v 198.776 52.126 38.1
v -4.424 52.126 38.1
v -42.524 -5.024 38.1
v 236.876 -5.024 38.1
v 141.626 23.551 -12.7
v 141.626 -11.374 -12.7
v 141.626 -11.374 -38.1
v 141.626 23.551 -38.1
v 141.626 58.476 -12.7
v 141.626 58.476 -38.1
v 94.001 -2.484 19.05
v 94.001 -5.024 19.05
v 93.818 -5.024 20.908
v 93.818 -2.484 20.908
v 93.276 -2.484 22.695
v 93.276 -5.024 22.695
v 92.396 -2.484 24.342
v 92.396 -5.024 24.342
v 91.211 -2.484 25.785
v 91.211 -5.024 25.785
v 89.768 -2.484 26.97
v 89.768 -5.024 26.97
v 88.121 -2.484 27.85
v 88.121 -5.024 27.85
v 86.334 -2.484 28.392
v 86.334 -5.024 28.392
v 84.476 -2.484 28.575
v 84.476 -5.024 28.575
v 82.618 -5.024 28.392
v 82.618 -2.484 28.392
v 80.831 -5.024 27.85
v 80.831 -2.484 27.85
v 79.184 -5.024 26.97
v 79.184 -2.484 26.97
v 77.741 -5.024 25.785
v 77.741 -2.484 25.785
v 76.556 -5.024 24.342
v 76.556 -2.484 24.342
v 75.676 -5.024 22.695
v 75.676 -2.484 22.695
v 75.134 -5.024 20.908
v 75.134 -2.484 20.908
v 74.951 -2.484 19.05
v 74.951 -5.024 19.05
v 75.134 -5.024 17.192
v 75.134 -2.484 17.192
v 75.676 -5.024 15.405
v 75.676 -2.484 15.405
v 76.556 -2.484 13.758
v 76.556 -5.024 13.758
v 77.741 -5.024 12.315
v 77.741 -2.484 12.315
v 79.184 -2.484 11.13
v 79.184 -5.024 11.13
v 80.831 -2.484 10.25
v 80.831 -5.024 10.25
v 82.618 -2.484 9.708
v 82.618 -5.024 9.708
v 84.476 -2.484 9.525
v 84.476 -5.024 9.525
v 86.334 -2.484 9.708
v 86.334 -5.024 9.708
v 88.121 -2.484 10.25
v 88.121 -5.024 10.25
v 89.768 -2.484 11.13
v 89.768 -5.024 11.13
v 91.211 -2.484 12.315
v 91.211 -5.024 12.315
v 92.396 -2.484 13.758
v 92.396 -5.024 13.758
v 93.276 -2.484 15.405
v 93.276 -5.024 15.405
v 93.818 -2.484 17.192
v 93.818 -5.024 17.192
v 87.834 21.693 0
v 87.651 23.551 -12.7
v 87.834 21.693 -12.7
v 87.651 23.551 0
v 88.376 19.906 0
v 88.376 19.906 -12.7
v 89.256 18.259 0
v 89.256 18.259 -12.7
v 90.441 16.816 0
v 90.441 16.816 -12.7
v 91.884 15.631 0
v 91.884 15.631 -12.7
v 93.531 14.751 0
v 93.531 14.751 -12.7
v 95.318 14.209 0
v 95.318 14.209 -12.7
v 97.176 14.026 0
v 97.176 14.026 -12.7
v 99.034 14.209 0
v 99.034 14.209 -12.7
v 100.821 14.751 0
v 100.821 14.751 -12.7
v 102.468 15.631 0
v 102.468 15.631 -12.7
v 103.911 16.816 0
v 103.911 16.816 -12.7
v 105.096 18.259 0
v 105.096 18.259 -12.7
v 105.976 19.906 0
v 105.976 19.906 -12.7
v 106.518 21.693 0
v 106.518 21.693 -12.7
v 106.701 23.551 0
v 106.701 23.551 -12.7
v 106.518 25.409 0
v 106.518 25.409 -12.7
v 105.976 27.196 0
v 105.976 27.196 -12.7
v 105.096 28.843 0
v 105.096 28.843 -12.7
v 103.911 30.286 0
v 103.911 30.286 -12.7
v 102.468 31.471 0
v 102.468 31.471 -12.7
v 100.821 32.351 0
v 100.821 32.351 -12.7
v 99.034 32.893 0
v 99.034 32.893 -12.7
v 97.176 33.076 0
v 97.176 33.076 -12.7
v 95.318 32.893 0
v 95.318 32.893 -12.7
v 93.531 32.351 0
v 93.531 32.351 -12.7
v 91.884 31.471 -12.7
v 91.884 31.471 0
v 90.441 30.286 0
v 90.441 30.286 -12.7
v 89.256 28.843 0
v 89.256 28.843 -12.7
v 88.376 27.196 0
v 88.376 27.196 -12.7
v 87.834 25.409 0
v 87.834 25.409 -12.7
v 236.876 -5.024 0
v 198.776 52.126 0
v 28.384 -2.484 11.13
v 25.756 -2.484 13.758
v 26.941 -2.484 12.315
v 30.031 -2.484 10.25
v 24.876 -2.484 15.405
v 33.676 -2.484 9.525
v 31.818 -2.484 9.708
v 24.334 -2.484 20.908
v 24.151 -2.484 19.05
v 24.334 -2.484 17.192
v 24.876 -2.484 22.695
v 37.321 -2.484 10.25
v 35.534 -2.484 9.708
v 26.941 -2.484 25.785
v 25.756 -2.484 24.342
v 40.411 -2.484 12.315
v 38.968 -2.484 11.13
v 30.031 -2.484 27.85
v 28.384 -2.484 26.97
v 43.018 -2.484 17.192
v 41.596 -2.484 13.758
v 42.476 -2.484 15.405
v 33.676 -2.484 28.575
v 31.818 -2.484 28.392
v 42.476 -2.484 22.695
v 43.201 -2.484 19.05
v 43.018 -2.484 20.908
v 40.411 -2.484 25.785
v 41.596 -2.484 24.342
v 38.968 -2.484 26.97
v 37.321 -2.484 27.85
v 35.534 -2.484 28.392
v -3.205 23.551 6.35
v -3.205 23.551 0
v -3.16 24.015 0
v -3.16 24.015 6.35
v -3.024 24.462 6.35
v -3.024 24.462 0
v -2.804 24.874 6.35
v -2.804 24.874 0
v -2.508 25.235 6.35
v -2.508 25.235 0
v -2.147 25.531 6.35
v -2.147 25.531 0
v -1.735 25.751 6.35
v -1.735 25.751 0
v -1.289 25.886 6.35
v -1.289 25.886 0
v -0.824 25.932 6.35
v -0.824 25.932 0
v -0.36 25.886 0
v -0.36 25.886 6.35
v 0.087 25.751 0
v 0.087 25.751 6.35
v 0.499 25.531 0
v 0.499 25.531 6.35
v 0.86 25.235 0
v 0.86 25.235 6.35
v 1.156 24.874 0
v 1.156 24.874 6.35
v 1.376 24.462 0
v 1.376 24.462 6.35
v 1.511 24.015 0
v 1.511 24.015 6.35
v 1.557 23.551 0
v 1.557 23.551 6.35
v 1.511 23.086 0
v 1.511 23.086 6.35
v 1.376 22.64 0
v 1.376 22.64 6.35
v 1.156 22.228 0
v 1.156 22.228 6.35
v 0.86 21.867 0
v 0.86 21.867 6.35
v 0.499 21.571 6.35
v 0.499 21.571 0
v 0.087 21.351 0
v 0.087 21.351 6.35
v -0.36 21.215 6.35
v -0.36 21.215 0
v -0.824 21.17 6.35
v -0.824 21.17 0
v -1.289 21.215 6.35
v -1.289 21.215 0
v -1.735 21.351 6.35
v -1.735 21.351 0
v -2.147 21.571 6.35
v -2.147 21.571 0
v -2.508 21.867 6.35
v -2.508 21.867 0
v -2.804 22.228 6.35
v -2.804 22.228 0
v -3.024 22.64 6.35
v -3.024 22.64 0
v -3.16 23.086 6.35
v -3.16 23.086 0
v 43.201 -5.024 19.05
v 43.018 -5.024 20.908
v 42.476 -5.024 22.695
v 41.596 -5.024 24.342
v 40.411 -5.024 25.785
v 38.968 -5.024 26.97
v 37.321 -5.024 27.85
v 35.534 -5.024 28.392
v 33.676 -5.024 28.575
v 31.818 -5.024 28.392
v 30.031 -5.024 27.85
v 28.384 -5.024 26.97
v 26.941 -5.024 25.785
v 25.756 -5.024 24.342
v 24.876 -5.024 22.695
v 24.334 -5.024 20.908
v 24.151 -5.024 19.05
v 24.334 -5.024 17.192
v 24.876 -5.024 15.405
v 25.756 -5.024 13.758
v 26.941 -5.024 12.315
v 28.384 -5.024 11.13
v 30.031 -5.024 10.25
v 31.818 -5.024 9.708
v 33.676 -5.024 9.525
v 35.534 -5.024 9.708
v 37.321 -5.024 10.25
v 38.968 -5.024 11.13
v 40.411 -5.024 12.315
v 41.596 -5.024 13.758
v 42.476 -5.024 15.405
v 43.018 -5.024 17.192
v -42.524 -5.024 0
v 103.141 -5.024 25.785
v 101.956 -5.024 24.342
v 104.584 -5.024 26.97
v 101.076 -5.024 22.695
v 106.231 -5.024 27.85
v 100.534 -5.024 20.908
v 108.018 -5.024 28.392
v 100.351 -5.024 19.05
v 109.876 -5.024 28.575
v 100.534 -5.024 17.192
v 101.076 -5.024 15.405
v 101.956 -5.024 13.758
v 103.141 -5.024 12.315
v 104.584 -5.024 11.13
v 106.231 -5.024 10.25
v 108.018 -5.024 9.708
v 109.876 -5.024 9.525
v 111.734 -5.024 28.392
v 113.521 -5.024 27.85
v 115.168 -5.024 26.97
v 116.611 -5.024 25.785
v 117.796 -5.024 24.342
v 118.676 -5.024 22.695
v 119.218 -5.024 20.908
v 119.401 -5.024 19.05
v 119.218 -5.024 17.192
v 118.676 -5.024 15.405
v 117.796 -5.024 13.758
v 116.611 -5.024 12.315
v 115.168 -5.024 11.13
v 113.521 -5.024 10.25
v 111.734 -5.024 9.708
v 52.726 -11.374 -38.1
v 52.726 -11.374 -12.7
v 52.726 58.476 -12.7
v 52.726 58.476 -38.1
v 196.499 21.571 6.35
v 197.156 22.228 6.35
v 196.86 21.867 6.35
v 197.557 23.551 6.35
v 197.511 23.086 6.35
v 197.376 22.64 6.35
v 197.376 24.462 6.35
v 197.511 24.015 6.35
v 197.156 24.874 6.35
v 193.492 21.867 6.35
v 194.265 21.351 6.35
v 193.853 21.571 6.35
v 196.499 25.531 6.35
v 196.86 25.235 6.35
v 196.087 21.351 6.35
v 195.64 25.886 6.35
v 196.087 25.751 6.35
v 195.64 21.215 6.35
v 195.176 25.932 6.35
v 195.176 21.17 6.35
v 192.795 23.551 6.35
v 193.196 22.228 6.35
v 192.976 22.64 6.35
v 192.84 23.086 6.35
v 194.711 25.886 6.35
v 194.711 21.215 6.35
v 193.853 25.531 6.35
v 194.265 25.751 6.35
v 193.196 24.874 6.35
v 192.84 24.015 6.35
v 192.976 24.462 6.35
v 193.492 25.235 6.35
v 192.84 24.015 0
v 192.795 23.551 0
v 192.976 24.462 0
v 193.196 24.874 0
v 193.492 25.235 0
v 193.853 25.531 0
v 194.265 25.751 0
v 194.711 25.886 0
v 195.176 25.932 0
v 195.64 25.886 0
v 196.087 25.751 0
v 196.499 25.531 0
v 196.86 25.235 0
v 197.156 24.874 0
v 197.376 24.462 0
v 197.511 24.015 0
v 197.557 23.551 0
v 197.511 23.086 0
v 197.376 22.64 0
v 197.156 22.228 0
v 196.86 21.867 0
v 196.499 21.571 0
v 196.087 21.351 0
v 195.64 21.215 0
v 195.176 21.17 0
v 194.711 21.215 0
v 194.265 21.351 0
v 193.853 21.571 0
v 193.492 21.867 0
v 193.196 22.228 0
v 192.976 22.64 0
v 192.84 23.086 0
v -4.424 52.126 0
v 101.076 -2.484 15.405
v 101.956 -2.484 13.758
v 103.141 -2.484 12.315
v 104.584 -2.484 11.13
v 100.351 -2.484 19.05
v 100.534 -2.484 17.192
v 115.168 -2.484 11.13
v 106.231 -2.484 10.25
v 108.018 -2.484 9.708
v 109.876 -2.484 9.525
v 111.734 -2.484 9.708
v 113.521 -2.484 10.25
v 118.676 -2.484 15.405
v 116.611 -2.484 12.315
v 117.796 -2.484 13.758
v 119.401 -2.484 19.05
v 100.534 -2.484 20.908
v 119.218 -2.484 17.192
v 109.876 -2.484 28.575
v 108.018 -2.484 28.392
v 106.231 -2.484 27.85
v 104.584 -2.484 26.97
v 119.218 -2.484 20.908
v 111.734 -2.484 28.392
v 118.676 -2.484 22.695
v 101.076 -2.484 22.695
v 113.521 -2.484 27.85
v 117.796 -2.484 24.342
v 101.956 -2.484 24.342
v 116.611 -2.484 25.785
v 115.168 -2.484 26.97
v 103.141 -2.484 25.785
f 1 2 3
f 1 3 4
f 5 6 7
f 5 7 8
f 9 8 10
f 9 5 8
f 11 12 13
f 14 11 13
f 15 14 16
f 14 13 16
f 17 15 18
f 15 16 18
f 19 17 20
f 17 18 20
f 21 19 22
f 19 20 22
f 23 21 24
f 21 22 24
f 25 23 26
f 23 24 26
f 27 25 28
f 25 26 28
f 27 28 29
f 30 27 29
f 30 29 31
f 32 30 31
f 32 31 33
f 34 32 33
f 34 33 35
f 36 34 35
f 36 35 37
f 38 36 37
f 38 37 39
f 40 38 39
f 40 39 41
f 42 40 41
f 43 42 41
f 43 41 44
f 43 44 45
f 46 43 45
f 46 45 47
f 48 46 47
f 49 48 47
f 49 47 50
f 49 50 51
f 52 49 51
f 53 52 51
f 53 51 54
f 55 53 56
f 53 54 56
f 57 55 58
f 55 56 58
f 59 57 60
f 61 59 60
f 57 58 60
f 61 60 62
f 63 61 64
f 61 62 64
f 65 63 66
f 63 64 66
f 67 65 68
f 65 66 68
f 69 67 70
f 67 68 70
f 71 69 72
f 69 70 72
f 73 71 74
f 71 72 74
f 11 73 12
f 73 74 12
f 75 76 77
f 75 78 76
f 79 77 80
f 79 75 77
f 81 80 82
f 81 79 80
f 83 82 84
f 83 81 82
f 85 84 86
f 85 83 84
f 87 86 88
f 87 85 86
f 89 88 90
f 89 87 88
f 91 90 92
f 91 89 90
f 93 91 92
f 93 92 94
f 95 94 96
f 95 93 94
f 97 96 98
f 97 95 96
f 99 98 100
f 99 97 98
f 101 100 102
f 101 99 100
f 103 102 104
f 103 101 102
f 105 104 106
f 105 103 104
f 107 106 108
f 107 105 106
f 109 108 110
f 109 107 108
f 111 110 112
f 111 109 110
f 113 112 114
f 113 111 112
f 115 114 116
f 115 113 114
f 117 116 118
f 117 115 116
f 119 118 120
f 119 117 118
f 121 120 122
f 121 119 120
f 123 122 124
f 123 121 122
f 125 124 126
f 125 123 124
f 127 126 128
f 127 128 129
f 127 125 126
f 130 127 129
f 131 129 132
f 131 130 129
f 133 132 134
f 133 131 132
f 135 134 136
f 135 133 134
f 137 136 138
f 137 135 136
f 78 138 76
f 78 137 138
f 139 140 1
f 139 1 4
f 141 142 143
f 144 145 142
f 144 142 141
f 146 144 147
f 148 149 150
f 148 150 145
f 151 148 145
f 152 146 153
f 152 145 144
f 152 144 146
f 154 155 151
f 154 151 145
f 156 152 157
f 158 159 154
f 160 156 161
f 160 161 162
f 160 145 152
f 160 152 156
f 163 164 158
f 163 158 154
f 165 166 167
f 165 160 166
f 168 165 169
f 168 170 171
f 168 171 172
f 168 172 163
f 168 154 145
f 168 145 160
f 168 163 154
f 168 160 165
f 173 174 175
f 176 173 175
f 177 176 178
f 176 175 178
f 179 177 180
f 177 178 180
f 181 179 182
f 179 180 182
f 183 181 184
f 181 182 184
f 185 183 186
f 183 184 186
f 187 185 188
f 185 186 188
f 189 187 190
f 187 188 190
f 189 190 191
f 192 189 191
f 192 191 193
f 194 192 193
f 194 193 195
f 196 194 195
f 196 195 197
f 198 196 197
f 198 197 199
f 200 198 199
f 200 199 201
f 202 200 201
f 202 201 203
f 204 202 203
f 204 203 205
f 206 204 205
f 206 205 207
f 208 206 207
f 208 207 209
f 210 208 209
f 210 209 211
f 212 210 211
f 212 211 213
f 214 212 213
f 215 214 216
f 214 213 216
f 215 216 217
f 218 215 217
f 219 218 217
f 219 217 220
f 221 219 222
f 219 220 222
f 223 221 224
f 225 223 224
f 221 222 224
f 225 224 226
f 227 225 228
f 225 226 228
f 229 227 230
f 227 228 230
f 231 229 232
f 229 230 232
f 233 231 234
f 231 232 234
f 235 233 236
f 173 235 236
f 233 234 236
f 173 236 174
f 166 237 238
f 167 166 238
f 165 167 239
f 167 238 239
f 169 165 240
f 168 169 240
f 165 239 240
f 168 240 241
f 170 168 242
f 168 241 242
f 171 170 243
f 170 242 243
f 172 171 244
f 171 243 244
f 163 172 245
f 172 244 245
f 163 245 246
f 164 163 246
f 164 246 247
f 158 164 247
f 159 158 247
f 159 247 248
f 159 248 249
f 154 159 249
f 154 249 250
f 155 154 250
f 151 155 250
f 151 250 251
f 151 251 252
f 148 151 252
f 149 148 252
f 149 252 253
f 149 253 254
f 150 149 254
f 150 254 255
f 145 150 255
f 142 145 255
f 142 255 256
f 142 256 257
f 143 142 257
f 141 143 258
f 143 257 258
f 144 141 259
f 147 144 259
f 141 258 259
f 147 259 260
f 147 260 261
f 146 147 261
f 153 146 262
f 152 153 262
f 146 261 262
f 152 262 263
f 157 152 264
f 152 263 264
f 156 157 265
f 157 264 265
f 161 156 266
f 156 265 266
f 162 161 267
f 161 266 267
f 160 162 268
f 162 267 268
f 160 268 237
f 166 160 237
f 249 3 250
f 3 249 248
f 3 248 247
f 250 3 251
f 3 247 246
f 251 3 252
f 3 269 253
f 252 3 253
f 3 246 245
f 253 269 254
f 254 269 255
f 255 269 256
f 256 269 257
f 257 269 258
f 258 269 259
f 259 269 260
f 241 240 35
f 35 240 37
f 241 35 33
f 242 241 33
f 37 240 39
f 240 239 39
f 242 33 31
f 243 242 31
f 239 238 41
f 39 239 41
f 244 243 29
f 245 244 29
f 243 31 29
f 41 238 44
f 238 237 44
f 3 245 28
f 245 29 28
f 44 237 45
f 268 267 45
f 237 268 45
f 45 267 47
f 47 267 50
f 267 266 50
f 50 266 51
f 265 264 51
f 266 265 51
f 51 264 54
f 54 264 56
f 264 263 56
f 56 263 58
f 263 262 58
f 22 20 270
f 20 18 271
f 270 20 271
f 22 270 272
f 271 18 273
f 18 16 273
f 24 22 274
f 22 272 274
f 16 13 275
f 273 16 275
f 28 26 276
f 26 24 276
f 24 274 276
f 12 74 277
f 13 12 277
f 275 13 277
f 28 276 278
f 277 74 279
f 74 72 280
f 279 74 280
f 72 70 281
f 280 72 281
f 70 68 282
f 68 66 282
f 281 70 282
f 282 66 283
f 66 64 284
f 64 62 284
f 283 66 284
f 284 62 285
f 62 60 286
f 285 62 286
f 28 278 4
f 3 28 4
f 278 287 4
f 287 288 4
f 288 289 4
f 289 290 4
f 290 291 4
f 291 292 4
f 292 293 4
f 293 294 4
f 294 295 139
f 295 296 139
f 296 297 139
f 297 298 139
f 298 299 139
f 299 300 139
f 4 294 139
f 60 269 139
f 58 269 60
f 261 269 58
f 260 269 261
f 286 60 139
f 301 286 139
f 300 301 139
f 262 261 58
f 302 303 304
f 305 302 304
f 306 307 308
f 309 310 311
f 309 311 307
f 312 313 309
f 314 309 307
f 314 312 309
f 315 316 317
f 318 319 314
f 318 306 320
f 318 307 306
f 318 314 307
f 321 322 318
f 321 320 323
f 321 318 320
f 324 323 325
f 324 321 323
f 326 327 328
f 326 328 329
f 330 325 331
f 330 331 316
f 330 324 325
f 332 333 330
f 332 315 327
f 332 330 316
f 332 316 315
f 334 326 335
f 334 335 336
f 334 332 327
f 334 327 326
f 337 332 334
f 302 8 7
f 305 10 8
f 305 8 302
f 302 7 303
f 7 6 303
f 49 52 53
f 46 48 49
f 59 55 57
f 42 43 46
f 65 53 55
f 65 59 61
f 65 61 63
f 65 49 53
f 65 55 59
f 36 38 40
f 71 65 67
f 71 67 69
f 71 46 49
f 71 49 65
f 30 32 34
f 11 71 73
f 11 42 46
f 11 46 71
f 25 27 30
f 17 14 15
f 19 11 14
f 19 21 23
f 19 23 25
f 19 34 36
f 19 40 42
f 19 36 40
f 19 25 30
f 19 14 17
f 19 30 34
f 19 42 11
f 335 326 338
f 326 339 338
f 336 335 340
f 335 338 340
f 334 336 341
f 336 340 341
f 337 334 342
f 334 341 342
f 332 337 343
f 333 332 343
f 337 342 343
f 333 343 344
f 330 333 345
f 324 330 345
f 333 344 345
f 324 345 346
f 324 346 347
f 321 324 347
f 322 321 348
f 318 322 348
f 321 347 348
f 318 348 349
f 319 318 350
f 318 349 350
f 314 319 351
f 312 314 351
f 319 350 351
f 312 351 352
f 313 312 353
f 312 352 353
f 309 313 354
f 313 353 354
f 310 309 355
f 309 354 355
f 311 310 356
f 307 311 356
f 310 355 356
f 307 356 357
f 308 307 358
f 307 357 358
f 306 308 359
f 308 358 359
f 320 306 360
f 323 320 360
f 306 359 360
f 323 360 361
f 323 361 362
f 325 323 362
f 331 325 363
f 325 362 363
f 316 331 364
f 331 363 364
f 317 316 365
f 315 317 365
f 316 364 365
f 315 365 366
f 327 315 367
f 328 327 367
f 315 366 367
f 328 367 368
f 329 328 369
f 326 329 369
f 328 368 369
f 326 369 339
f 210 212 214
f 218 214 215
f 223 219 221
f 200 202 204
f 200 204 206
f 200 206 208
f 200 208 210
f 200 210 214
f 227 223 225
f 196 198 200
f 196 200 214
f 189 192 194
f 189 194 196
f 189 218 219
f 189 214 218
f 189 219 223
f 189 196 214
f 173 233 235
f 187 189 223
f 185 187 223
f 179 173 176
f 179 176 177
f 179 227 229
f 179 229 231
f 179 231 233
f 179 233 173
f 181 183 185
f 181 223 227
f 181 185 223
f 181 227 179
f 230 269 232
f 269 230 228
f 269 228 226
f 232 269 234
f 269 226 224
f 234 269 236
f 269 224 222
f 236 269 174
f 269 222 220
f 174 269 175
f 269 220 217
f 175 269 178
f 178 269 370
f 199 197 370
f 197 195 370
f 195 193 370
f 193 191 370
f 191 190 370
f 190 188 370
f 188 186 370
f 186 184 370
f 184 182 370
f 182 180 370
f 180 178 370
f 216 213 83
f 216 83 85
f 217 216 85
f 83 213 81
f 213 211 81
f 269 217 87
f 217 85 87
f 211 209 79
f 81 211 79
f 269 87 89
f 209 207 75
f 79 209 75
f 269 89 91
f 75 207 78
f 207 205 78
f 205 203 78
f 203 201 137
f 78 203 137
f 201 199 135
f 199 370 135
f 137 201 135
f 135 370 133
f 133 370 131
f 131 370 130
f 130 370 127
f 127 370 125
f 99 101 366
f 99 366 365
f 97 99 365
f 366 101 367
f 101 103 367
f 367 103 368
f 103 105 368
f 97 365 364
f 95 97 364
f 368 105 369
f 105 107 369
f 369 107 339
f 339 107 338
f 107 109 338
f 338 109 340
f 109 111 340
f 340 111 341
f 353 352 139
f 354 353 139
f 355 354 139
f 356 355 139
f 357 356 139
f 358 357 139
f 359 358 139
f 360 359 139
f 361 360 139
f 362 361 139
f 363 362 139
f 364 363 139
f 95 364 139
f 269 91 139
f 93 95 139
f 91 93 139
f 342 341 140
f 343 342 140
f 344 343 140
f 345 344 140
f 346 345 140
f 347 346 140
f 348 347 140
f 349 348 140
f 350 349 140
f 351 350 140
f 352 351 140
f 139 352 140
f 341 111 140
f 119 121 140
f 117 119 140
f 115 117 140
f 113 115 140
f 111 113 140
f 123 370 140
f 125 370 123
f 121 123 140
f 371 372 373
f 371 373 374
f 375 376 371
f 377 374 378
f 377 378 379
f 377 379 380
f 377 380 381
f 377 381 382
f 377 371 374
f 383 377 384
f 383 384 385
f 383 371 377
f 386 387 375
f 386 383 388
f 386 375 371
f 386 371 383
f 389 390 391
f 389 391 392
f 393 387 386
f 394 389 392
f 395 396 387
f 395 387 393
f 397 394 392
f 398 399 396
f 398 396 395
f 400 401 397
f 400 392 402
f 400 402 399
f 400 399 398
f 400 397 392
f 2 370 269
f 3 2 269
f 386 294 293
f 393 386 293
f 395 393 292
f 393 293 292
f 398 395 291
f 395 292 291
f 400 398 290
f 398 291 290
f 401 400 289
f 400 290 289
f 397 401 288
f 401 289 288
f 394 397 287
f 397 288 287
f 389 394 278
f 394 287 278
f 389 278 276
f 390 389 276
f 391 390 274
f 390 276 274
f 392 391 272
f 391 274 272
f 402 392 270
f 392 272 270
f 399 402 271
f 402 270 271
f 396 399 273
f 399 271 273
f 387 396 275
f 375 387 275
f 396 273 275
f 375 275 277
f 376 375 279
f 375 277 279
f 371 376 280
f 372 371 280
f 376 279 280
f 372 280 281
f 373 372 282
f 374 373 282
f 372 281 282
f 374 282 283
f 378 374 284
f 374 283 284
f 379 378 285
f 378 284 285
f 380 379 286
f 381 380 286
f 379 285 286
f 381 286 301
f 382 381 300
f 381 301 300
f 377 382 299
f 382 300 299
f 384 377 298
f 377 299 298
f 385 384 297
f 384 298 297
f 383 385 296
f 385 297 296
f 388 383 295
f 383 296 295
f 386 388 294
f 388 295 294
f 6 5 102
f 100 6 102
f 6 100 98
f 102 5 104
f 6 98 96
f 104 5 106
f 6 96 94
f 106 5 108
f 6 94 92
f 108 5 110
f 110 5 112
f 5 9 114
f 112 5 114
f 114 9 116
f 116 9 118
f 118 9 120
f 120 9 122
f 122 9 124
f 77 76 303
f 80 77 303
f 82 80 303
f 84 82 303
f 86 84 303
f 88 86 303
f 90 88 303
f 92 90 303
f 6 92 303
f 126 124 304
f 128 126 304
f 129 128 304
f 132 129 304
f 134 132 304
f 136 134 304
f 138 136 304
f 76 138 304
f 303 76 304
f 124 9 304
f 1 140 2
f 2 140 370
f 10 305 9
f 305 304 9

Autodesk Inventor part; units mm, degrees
ref_plane "YZ Plane" through (0, 0, 0) normal (1, 0, 0) x (0, 1, 0)
ref_plane "XZ Plane" through (0, 0, 0) normal (0, 1, 0) x (-1, 0, 0)
ref_plane "XY Plane" through (0, 0, 0) normal (0, 0, 1) x (1, 0, 0)
sketch "Sketch1" plane through (0, 0, 0) normal (0, 0, 1) x (1, 0, 0)
  line L0 (-42.5241, -5.0241) -> (236.8759, -5.0241)
  line L1 (97.1759, -5.0241) -> (97.1759, 52.1259)
  line L2 (97.1759, 52.1259) -> (-4.4241, 52.1259)
  line L3 (-4.4241, 52.1259) -> (198.7759, 52.1259)
  line L4 (198.7759, 52.1259) -> (236.8759, -5.0241)
  line L5 (-4.4241, 52.1259) -> (-42.5241, -5.0241)
  point P0 (0, 0)
  dimension "d0" = 279.4
  dimension "d1" = 57.15
  dimension "d2" = 101.6
  dimension "d3" = 203.2
extrude "Extrusion1" add sketch "Sketch1" along normal blind 38.1
sketch "Sketch2" plane through (0, 0, 0) normal (0, 0, -1) x (-1, 0, 0)
  line L0 (-236.8759, -5.0241) -> (-198.7759, 52.1259) projected
  line L1 (42.5241, -5.0241) -> (-236.8759, -5.0241) projected
  line L2 (4.4241, 52.1259) -> (42.5241, -5.0241) projected
  line L3 (-198.7759, 52.1259) -> (4.4241, 52.1259) projected
  line L4 (23.4741, 23.5509) -> (-217.8259, 23.5509)
  line L5 (-97.1759, -5.0241) -> (-97.1759, 52.1259)
  circle A0 centre (-97.1759, 23.5509) radius 9.525
  point P0 (0, 0)
  dimension "d6" = 19.05
extrude "Extrusion2" add sketch "Sketch2" along normal blind 12.7 contours A0 L5 L4 | L4 L5 A0 | L5 L4 A0 | L5 A0 L4
sketch "Sketch3" plane through (97.1759, 23.5509, -12.7) normal (0, 0, -1) x (-1, 0, 0)
  circle A0 centre (0, 0) radius 9.525 projected
  line L0 (0, 0) -> (-44.45, 0)
  line L1 (-44.45, 0) -> (-44.45, -34.925)
  line L2 (-44.45, -34.925) -> (44.45, -34.925)
  line L3 (44.45, -34.925) -> (44.45, 34.925)
  line L4 (44.45, 34.925) -> (-44.45, 34.925)
  line L5 (-44.45, 0) -> (-44.45, 34.925)
  point P0 (97.1759, -23.5509)
  dimension "d9" = 44.45
  dimension "d10" = 34.925
  dimension "d11" = 88.9
  dimension "d12" = 69.85
extrude "Extrusion3" add sketch "Sketch3" along normal blind 25.4 contours A0 | L5 L4 L3 L2 L1
sketch "Sketch4" plane through (-42.5241, -5.0241, 0) normal (0, -1, 0) x (1, 0, 0)
  line L0 (0, 0) -> (279.4, 0) projected
  line L1 (279.4, 0) -> (279.4, 38.1) projected
  line L2 (139.7, 0) -> (139.7, 19.05)
  line L3 (139.7, 19.05) -> (152.4, 19.05)
  line L4 (152.4, 19.05) -> (139.7, 19.05)
  line L5 (139.7, 19.05) -> (127, 19.05)
  circle A0 centre (127, 19.05) radius 9.525
  circle A1 centre (152.4, 19.05) radius 9.525
  line L6 (139.7, 19.05) -> (76.2, 19.05)
  circle A2 centre (76.2, 19.05) radius 9.525
  point P0 (42.5241, 0)
  dimension "d15" = 12.7
  dimension "d16" = 12.7
  dimension "d17" = 12.7
  dimension "d18" = 19.05
  dimension "d19" = 19.05
  dimension "d20" = 63.5
extrude "Extrusion4" cut sketch "Sketch4" against normal blind 2.54
sketch "Sketch5" plane through (0, 0, 0) normal (0, 0, -1) x (-1, 0, 0)
  circle A0 centre (-97.1759, 23.5509) radius 9.525 projected
  line L0 (-198.7759, 52.1259) -> (4.4241, 52.1259) projected
  line L1 (-97.1759, 23.5509) -> (0.8241, 23.5509)
  line L2 (-97.1759, 23.5509) -> (-195.1759, 23.5509)
  circle A1 centre (-195.1759, 23.5509) radius 2.3813
  circle A2 centre (0.8241, 23.5509) radius 2.3813
  point P0 (0, 0)
  dimension "d23" = 98
  dimension "d24" = 98
  dimension "d25" = 4.7625
extrude "Extrusion5" cut sketch "Sketch5" against normal blind 6.35 contours A1 | A2
properties part number "kinect basic"
